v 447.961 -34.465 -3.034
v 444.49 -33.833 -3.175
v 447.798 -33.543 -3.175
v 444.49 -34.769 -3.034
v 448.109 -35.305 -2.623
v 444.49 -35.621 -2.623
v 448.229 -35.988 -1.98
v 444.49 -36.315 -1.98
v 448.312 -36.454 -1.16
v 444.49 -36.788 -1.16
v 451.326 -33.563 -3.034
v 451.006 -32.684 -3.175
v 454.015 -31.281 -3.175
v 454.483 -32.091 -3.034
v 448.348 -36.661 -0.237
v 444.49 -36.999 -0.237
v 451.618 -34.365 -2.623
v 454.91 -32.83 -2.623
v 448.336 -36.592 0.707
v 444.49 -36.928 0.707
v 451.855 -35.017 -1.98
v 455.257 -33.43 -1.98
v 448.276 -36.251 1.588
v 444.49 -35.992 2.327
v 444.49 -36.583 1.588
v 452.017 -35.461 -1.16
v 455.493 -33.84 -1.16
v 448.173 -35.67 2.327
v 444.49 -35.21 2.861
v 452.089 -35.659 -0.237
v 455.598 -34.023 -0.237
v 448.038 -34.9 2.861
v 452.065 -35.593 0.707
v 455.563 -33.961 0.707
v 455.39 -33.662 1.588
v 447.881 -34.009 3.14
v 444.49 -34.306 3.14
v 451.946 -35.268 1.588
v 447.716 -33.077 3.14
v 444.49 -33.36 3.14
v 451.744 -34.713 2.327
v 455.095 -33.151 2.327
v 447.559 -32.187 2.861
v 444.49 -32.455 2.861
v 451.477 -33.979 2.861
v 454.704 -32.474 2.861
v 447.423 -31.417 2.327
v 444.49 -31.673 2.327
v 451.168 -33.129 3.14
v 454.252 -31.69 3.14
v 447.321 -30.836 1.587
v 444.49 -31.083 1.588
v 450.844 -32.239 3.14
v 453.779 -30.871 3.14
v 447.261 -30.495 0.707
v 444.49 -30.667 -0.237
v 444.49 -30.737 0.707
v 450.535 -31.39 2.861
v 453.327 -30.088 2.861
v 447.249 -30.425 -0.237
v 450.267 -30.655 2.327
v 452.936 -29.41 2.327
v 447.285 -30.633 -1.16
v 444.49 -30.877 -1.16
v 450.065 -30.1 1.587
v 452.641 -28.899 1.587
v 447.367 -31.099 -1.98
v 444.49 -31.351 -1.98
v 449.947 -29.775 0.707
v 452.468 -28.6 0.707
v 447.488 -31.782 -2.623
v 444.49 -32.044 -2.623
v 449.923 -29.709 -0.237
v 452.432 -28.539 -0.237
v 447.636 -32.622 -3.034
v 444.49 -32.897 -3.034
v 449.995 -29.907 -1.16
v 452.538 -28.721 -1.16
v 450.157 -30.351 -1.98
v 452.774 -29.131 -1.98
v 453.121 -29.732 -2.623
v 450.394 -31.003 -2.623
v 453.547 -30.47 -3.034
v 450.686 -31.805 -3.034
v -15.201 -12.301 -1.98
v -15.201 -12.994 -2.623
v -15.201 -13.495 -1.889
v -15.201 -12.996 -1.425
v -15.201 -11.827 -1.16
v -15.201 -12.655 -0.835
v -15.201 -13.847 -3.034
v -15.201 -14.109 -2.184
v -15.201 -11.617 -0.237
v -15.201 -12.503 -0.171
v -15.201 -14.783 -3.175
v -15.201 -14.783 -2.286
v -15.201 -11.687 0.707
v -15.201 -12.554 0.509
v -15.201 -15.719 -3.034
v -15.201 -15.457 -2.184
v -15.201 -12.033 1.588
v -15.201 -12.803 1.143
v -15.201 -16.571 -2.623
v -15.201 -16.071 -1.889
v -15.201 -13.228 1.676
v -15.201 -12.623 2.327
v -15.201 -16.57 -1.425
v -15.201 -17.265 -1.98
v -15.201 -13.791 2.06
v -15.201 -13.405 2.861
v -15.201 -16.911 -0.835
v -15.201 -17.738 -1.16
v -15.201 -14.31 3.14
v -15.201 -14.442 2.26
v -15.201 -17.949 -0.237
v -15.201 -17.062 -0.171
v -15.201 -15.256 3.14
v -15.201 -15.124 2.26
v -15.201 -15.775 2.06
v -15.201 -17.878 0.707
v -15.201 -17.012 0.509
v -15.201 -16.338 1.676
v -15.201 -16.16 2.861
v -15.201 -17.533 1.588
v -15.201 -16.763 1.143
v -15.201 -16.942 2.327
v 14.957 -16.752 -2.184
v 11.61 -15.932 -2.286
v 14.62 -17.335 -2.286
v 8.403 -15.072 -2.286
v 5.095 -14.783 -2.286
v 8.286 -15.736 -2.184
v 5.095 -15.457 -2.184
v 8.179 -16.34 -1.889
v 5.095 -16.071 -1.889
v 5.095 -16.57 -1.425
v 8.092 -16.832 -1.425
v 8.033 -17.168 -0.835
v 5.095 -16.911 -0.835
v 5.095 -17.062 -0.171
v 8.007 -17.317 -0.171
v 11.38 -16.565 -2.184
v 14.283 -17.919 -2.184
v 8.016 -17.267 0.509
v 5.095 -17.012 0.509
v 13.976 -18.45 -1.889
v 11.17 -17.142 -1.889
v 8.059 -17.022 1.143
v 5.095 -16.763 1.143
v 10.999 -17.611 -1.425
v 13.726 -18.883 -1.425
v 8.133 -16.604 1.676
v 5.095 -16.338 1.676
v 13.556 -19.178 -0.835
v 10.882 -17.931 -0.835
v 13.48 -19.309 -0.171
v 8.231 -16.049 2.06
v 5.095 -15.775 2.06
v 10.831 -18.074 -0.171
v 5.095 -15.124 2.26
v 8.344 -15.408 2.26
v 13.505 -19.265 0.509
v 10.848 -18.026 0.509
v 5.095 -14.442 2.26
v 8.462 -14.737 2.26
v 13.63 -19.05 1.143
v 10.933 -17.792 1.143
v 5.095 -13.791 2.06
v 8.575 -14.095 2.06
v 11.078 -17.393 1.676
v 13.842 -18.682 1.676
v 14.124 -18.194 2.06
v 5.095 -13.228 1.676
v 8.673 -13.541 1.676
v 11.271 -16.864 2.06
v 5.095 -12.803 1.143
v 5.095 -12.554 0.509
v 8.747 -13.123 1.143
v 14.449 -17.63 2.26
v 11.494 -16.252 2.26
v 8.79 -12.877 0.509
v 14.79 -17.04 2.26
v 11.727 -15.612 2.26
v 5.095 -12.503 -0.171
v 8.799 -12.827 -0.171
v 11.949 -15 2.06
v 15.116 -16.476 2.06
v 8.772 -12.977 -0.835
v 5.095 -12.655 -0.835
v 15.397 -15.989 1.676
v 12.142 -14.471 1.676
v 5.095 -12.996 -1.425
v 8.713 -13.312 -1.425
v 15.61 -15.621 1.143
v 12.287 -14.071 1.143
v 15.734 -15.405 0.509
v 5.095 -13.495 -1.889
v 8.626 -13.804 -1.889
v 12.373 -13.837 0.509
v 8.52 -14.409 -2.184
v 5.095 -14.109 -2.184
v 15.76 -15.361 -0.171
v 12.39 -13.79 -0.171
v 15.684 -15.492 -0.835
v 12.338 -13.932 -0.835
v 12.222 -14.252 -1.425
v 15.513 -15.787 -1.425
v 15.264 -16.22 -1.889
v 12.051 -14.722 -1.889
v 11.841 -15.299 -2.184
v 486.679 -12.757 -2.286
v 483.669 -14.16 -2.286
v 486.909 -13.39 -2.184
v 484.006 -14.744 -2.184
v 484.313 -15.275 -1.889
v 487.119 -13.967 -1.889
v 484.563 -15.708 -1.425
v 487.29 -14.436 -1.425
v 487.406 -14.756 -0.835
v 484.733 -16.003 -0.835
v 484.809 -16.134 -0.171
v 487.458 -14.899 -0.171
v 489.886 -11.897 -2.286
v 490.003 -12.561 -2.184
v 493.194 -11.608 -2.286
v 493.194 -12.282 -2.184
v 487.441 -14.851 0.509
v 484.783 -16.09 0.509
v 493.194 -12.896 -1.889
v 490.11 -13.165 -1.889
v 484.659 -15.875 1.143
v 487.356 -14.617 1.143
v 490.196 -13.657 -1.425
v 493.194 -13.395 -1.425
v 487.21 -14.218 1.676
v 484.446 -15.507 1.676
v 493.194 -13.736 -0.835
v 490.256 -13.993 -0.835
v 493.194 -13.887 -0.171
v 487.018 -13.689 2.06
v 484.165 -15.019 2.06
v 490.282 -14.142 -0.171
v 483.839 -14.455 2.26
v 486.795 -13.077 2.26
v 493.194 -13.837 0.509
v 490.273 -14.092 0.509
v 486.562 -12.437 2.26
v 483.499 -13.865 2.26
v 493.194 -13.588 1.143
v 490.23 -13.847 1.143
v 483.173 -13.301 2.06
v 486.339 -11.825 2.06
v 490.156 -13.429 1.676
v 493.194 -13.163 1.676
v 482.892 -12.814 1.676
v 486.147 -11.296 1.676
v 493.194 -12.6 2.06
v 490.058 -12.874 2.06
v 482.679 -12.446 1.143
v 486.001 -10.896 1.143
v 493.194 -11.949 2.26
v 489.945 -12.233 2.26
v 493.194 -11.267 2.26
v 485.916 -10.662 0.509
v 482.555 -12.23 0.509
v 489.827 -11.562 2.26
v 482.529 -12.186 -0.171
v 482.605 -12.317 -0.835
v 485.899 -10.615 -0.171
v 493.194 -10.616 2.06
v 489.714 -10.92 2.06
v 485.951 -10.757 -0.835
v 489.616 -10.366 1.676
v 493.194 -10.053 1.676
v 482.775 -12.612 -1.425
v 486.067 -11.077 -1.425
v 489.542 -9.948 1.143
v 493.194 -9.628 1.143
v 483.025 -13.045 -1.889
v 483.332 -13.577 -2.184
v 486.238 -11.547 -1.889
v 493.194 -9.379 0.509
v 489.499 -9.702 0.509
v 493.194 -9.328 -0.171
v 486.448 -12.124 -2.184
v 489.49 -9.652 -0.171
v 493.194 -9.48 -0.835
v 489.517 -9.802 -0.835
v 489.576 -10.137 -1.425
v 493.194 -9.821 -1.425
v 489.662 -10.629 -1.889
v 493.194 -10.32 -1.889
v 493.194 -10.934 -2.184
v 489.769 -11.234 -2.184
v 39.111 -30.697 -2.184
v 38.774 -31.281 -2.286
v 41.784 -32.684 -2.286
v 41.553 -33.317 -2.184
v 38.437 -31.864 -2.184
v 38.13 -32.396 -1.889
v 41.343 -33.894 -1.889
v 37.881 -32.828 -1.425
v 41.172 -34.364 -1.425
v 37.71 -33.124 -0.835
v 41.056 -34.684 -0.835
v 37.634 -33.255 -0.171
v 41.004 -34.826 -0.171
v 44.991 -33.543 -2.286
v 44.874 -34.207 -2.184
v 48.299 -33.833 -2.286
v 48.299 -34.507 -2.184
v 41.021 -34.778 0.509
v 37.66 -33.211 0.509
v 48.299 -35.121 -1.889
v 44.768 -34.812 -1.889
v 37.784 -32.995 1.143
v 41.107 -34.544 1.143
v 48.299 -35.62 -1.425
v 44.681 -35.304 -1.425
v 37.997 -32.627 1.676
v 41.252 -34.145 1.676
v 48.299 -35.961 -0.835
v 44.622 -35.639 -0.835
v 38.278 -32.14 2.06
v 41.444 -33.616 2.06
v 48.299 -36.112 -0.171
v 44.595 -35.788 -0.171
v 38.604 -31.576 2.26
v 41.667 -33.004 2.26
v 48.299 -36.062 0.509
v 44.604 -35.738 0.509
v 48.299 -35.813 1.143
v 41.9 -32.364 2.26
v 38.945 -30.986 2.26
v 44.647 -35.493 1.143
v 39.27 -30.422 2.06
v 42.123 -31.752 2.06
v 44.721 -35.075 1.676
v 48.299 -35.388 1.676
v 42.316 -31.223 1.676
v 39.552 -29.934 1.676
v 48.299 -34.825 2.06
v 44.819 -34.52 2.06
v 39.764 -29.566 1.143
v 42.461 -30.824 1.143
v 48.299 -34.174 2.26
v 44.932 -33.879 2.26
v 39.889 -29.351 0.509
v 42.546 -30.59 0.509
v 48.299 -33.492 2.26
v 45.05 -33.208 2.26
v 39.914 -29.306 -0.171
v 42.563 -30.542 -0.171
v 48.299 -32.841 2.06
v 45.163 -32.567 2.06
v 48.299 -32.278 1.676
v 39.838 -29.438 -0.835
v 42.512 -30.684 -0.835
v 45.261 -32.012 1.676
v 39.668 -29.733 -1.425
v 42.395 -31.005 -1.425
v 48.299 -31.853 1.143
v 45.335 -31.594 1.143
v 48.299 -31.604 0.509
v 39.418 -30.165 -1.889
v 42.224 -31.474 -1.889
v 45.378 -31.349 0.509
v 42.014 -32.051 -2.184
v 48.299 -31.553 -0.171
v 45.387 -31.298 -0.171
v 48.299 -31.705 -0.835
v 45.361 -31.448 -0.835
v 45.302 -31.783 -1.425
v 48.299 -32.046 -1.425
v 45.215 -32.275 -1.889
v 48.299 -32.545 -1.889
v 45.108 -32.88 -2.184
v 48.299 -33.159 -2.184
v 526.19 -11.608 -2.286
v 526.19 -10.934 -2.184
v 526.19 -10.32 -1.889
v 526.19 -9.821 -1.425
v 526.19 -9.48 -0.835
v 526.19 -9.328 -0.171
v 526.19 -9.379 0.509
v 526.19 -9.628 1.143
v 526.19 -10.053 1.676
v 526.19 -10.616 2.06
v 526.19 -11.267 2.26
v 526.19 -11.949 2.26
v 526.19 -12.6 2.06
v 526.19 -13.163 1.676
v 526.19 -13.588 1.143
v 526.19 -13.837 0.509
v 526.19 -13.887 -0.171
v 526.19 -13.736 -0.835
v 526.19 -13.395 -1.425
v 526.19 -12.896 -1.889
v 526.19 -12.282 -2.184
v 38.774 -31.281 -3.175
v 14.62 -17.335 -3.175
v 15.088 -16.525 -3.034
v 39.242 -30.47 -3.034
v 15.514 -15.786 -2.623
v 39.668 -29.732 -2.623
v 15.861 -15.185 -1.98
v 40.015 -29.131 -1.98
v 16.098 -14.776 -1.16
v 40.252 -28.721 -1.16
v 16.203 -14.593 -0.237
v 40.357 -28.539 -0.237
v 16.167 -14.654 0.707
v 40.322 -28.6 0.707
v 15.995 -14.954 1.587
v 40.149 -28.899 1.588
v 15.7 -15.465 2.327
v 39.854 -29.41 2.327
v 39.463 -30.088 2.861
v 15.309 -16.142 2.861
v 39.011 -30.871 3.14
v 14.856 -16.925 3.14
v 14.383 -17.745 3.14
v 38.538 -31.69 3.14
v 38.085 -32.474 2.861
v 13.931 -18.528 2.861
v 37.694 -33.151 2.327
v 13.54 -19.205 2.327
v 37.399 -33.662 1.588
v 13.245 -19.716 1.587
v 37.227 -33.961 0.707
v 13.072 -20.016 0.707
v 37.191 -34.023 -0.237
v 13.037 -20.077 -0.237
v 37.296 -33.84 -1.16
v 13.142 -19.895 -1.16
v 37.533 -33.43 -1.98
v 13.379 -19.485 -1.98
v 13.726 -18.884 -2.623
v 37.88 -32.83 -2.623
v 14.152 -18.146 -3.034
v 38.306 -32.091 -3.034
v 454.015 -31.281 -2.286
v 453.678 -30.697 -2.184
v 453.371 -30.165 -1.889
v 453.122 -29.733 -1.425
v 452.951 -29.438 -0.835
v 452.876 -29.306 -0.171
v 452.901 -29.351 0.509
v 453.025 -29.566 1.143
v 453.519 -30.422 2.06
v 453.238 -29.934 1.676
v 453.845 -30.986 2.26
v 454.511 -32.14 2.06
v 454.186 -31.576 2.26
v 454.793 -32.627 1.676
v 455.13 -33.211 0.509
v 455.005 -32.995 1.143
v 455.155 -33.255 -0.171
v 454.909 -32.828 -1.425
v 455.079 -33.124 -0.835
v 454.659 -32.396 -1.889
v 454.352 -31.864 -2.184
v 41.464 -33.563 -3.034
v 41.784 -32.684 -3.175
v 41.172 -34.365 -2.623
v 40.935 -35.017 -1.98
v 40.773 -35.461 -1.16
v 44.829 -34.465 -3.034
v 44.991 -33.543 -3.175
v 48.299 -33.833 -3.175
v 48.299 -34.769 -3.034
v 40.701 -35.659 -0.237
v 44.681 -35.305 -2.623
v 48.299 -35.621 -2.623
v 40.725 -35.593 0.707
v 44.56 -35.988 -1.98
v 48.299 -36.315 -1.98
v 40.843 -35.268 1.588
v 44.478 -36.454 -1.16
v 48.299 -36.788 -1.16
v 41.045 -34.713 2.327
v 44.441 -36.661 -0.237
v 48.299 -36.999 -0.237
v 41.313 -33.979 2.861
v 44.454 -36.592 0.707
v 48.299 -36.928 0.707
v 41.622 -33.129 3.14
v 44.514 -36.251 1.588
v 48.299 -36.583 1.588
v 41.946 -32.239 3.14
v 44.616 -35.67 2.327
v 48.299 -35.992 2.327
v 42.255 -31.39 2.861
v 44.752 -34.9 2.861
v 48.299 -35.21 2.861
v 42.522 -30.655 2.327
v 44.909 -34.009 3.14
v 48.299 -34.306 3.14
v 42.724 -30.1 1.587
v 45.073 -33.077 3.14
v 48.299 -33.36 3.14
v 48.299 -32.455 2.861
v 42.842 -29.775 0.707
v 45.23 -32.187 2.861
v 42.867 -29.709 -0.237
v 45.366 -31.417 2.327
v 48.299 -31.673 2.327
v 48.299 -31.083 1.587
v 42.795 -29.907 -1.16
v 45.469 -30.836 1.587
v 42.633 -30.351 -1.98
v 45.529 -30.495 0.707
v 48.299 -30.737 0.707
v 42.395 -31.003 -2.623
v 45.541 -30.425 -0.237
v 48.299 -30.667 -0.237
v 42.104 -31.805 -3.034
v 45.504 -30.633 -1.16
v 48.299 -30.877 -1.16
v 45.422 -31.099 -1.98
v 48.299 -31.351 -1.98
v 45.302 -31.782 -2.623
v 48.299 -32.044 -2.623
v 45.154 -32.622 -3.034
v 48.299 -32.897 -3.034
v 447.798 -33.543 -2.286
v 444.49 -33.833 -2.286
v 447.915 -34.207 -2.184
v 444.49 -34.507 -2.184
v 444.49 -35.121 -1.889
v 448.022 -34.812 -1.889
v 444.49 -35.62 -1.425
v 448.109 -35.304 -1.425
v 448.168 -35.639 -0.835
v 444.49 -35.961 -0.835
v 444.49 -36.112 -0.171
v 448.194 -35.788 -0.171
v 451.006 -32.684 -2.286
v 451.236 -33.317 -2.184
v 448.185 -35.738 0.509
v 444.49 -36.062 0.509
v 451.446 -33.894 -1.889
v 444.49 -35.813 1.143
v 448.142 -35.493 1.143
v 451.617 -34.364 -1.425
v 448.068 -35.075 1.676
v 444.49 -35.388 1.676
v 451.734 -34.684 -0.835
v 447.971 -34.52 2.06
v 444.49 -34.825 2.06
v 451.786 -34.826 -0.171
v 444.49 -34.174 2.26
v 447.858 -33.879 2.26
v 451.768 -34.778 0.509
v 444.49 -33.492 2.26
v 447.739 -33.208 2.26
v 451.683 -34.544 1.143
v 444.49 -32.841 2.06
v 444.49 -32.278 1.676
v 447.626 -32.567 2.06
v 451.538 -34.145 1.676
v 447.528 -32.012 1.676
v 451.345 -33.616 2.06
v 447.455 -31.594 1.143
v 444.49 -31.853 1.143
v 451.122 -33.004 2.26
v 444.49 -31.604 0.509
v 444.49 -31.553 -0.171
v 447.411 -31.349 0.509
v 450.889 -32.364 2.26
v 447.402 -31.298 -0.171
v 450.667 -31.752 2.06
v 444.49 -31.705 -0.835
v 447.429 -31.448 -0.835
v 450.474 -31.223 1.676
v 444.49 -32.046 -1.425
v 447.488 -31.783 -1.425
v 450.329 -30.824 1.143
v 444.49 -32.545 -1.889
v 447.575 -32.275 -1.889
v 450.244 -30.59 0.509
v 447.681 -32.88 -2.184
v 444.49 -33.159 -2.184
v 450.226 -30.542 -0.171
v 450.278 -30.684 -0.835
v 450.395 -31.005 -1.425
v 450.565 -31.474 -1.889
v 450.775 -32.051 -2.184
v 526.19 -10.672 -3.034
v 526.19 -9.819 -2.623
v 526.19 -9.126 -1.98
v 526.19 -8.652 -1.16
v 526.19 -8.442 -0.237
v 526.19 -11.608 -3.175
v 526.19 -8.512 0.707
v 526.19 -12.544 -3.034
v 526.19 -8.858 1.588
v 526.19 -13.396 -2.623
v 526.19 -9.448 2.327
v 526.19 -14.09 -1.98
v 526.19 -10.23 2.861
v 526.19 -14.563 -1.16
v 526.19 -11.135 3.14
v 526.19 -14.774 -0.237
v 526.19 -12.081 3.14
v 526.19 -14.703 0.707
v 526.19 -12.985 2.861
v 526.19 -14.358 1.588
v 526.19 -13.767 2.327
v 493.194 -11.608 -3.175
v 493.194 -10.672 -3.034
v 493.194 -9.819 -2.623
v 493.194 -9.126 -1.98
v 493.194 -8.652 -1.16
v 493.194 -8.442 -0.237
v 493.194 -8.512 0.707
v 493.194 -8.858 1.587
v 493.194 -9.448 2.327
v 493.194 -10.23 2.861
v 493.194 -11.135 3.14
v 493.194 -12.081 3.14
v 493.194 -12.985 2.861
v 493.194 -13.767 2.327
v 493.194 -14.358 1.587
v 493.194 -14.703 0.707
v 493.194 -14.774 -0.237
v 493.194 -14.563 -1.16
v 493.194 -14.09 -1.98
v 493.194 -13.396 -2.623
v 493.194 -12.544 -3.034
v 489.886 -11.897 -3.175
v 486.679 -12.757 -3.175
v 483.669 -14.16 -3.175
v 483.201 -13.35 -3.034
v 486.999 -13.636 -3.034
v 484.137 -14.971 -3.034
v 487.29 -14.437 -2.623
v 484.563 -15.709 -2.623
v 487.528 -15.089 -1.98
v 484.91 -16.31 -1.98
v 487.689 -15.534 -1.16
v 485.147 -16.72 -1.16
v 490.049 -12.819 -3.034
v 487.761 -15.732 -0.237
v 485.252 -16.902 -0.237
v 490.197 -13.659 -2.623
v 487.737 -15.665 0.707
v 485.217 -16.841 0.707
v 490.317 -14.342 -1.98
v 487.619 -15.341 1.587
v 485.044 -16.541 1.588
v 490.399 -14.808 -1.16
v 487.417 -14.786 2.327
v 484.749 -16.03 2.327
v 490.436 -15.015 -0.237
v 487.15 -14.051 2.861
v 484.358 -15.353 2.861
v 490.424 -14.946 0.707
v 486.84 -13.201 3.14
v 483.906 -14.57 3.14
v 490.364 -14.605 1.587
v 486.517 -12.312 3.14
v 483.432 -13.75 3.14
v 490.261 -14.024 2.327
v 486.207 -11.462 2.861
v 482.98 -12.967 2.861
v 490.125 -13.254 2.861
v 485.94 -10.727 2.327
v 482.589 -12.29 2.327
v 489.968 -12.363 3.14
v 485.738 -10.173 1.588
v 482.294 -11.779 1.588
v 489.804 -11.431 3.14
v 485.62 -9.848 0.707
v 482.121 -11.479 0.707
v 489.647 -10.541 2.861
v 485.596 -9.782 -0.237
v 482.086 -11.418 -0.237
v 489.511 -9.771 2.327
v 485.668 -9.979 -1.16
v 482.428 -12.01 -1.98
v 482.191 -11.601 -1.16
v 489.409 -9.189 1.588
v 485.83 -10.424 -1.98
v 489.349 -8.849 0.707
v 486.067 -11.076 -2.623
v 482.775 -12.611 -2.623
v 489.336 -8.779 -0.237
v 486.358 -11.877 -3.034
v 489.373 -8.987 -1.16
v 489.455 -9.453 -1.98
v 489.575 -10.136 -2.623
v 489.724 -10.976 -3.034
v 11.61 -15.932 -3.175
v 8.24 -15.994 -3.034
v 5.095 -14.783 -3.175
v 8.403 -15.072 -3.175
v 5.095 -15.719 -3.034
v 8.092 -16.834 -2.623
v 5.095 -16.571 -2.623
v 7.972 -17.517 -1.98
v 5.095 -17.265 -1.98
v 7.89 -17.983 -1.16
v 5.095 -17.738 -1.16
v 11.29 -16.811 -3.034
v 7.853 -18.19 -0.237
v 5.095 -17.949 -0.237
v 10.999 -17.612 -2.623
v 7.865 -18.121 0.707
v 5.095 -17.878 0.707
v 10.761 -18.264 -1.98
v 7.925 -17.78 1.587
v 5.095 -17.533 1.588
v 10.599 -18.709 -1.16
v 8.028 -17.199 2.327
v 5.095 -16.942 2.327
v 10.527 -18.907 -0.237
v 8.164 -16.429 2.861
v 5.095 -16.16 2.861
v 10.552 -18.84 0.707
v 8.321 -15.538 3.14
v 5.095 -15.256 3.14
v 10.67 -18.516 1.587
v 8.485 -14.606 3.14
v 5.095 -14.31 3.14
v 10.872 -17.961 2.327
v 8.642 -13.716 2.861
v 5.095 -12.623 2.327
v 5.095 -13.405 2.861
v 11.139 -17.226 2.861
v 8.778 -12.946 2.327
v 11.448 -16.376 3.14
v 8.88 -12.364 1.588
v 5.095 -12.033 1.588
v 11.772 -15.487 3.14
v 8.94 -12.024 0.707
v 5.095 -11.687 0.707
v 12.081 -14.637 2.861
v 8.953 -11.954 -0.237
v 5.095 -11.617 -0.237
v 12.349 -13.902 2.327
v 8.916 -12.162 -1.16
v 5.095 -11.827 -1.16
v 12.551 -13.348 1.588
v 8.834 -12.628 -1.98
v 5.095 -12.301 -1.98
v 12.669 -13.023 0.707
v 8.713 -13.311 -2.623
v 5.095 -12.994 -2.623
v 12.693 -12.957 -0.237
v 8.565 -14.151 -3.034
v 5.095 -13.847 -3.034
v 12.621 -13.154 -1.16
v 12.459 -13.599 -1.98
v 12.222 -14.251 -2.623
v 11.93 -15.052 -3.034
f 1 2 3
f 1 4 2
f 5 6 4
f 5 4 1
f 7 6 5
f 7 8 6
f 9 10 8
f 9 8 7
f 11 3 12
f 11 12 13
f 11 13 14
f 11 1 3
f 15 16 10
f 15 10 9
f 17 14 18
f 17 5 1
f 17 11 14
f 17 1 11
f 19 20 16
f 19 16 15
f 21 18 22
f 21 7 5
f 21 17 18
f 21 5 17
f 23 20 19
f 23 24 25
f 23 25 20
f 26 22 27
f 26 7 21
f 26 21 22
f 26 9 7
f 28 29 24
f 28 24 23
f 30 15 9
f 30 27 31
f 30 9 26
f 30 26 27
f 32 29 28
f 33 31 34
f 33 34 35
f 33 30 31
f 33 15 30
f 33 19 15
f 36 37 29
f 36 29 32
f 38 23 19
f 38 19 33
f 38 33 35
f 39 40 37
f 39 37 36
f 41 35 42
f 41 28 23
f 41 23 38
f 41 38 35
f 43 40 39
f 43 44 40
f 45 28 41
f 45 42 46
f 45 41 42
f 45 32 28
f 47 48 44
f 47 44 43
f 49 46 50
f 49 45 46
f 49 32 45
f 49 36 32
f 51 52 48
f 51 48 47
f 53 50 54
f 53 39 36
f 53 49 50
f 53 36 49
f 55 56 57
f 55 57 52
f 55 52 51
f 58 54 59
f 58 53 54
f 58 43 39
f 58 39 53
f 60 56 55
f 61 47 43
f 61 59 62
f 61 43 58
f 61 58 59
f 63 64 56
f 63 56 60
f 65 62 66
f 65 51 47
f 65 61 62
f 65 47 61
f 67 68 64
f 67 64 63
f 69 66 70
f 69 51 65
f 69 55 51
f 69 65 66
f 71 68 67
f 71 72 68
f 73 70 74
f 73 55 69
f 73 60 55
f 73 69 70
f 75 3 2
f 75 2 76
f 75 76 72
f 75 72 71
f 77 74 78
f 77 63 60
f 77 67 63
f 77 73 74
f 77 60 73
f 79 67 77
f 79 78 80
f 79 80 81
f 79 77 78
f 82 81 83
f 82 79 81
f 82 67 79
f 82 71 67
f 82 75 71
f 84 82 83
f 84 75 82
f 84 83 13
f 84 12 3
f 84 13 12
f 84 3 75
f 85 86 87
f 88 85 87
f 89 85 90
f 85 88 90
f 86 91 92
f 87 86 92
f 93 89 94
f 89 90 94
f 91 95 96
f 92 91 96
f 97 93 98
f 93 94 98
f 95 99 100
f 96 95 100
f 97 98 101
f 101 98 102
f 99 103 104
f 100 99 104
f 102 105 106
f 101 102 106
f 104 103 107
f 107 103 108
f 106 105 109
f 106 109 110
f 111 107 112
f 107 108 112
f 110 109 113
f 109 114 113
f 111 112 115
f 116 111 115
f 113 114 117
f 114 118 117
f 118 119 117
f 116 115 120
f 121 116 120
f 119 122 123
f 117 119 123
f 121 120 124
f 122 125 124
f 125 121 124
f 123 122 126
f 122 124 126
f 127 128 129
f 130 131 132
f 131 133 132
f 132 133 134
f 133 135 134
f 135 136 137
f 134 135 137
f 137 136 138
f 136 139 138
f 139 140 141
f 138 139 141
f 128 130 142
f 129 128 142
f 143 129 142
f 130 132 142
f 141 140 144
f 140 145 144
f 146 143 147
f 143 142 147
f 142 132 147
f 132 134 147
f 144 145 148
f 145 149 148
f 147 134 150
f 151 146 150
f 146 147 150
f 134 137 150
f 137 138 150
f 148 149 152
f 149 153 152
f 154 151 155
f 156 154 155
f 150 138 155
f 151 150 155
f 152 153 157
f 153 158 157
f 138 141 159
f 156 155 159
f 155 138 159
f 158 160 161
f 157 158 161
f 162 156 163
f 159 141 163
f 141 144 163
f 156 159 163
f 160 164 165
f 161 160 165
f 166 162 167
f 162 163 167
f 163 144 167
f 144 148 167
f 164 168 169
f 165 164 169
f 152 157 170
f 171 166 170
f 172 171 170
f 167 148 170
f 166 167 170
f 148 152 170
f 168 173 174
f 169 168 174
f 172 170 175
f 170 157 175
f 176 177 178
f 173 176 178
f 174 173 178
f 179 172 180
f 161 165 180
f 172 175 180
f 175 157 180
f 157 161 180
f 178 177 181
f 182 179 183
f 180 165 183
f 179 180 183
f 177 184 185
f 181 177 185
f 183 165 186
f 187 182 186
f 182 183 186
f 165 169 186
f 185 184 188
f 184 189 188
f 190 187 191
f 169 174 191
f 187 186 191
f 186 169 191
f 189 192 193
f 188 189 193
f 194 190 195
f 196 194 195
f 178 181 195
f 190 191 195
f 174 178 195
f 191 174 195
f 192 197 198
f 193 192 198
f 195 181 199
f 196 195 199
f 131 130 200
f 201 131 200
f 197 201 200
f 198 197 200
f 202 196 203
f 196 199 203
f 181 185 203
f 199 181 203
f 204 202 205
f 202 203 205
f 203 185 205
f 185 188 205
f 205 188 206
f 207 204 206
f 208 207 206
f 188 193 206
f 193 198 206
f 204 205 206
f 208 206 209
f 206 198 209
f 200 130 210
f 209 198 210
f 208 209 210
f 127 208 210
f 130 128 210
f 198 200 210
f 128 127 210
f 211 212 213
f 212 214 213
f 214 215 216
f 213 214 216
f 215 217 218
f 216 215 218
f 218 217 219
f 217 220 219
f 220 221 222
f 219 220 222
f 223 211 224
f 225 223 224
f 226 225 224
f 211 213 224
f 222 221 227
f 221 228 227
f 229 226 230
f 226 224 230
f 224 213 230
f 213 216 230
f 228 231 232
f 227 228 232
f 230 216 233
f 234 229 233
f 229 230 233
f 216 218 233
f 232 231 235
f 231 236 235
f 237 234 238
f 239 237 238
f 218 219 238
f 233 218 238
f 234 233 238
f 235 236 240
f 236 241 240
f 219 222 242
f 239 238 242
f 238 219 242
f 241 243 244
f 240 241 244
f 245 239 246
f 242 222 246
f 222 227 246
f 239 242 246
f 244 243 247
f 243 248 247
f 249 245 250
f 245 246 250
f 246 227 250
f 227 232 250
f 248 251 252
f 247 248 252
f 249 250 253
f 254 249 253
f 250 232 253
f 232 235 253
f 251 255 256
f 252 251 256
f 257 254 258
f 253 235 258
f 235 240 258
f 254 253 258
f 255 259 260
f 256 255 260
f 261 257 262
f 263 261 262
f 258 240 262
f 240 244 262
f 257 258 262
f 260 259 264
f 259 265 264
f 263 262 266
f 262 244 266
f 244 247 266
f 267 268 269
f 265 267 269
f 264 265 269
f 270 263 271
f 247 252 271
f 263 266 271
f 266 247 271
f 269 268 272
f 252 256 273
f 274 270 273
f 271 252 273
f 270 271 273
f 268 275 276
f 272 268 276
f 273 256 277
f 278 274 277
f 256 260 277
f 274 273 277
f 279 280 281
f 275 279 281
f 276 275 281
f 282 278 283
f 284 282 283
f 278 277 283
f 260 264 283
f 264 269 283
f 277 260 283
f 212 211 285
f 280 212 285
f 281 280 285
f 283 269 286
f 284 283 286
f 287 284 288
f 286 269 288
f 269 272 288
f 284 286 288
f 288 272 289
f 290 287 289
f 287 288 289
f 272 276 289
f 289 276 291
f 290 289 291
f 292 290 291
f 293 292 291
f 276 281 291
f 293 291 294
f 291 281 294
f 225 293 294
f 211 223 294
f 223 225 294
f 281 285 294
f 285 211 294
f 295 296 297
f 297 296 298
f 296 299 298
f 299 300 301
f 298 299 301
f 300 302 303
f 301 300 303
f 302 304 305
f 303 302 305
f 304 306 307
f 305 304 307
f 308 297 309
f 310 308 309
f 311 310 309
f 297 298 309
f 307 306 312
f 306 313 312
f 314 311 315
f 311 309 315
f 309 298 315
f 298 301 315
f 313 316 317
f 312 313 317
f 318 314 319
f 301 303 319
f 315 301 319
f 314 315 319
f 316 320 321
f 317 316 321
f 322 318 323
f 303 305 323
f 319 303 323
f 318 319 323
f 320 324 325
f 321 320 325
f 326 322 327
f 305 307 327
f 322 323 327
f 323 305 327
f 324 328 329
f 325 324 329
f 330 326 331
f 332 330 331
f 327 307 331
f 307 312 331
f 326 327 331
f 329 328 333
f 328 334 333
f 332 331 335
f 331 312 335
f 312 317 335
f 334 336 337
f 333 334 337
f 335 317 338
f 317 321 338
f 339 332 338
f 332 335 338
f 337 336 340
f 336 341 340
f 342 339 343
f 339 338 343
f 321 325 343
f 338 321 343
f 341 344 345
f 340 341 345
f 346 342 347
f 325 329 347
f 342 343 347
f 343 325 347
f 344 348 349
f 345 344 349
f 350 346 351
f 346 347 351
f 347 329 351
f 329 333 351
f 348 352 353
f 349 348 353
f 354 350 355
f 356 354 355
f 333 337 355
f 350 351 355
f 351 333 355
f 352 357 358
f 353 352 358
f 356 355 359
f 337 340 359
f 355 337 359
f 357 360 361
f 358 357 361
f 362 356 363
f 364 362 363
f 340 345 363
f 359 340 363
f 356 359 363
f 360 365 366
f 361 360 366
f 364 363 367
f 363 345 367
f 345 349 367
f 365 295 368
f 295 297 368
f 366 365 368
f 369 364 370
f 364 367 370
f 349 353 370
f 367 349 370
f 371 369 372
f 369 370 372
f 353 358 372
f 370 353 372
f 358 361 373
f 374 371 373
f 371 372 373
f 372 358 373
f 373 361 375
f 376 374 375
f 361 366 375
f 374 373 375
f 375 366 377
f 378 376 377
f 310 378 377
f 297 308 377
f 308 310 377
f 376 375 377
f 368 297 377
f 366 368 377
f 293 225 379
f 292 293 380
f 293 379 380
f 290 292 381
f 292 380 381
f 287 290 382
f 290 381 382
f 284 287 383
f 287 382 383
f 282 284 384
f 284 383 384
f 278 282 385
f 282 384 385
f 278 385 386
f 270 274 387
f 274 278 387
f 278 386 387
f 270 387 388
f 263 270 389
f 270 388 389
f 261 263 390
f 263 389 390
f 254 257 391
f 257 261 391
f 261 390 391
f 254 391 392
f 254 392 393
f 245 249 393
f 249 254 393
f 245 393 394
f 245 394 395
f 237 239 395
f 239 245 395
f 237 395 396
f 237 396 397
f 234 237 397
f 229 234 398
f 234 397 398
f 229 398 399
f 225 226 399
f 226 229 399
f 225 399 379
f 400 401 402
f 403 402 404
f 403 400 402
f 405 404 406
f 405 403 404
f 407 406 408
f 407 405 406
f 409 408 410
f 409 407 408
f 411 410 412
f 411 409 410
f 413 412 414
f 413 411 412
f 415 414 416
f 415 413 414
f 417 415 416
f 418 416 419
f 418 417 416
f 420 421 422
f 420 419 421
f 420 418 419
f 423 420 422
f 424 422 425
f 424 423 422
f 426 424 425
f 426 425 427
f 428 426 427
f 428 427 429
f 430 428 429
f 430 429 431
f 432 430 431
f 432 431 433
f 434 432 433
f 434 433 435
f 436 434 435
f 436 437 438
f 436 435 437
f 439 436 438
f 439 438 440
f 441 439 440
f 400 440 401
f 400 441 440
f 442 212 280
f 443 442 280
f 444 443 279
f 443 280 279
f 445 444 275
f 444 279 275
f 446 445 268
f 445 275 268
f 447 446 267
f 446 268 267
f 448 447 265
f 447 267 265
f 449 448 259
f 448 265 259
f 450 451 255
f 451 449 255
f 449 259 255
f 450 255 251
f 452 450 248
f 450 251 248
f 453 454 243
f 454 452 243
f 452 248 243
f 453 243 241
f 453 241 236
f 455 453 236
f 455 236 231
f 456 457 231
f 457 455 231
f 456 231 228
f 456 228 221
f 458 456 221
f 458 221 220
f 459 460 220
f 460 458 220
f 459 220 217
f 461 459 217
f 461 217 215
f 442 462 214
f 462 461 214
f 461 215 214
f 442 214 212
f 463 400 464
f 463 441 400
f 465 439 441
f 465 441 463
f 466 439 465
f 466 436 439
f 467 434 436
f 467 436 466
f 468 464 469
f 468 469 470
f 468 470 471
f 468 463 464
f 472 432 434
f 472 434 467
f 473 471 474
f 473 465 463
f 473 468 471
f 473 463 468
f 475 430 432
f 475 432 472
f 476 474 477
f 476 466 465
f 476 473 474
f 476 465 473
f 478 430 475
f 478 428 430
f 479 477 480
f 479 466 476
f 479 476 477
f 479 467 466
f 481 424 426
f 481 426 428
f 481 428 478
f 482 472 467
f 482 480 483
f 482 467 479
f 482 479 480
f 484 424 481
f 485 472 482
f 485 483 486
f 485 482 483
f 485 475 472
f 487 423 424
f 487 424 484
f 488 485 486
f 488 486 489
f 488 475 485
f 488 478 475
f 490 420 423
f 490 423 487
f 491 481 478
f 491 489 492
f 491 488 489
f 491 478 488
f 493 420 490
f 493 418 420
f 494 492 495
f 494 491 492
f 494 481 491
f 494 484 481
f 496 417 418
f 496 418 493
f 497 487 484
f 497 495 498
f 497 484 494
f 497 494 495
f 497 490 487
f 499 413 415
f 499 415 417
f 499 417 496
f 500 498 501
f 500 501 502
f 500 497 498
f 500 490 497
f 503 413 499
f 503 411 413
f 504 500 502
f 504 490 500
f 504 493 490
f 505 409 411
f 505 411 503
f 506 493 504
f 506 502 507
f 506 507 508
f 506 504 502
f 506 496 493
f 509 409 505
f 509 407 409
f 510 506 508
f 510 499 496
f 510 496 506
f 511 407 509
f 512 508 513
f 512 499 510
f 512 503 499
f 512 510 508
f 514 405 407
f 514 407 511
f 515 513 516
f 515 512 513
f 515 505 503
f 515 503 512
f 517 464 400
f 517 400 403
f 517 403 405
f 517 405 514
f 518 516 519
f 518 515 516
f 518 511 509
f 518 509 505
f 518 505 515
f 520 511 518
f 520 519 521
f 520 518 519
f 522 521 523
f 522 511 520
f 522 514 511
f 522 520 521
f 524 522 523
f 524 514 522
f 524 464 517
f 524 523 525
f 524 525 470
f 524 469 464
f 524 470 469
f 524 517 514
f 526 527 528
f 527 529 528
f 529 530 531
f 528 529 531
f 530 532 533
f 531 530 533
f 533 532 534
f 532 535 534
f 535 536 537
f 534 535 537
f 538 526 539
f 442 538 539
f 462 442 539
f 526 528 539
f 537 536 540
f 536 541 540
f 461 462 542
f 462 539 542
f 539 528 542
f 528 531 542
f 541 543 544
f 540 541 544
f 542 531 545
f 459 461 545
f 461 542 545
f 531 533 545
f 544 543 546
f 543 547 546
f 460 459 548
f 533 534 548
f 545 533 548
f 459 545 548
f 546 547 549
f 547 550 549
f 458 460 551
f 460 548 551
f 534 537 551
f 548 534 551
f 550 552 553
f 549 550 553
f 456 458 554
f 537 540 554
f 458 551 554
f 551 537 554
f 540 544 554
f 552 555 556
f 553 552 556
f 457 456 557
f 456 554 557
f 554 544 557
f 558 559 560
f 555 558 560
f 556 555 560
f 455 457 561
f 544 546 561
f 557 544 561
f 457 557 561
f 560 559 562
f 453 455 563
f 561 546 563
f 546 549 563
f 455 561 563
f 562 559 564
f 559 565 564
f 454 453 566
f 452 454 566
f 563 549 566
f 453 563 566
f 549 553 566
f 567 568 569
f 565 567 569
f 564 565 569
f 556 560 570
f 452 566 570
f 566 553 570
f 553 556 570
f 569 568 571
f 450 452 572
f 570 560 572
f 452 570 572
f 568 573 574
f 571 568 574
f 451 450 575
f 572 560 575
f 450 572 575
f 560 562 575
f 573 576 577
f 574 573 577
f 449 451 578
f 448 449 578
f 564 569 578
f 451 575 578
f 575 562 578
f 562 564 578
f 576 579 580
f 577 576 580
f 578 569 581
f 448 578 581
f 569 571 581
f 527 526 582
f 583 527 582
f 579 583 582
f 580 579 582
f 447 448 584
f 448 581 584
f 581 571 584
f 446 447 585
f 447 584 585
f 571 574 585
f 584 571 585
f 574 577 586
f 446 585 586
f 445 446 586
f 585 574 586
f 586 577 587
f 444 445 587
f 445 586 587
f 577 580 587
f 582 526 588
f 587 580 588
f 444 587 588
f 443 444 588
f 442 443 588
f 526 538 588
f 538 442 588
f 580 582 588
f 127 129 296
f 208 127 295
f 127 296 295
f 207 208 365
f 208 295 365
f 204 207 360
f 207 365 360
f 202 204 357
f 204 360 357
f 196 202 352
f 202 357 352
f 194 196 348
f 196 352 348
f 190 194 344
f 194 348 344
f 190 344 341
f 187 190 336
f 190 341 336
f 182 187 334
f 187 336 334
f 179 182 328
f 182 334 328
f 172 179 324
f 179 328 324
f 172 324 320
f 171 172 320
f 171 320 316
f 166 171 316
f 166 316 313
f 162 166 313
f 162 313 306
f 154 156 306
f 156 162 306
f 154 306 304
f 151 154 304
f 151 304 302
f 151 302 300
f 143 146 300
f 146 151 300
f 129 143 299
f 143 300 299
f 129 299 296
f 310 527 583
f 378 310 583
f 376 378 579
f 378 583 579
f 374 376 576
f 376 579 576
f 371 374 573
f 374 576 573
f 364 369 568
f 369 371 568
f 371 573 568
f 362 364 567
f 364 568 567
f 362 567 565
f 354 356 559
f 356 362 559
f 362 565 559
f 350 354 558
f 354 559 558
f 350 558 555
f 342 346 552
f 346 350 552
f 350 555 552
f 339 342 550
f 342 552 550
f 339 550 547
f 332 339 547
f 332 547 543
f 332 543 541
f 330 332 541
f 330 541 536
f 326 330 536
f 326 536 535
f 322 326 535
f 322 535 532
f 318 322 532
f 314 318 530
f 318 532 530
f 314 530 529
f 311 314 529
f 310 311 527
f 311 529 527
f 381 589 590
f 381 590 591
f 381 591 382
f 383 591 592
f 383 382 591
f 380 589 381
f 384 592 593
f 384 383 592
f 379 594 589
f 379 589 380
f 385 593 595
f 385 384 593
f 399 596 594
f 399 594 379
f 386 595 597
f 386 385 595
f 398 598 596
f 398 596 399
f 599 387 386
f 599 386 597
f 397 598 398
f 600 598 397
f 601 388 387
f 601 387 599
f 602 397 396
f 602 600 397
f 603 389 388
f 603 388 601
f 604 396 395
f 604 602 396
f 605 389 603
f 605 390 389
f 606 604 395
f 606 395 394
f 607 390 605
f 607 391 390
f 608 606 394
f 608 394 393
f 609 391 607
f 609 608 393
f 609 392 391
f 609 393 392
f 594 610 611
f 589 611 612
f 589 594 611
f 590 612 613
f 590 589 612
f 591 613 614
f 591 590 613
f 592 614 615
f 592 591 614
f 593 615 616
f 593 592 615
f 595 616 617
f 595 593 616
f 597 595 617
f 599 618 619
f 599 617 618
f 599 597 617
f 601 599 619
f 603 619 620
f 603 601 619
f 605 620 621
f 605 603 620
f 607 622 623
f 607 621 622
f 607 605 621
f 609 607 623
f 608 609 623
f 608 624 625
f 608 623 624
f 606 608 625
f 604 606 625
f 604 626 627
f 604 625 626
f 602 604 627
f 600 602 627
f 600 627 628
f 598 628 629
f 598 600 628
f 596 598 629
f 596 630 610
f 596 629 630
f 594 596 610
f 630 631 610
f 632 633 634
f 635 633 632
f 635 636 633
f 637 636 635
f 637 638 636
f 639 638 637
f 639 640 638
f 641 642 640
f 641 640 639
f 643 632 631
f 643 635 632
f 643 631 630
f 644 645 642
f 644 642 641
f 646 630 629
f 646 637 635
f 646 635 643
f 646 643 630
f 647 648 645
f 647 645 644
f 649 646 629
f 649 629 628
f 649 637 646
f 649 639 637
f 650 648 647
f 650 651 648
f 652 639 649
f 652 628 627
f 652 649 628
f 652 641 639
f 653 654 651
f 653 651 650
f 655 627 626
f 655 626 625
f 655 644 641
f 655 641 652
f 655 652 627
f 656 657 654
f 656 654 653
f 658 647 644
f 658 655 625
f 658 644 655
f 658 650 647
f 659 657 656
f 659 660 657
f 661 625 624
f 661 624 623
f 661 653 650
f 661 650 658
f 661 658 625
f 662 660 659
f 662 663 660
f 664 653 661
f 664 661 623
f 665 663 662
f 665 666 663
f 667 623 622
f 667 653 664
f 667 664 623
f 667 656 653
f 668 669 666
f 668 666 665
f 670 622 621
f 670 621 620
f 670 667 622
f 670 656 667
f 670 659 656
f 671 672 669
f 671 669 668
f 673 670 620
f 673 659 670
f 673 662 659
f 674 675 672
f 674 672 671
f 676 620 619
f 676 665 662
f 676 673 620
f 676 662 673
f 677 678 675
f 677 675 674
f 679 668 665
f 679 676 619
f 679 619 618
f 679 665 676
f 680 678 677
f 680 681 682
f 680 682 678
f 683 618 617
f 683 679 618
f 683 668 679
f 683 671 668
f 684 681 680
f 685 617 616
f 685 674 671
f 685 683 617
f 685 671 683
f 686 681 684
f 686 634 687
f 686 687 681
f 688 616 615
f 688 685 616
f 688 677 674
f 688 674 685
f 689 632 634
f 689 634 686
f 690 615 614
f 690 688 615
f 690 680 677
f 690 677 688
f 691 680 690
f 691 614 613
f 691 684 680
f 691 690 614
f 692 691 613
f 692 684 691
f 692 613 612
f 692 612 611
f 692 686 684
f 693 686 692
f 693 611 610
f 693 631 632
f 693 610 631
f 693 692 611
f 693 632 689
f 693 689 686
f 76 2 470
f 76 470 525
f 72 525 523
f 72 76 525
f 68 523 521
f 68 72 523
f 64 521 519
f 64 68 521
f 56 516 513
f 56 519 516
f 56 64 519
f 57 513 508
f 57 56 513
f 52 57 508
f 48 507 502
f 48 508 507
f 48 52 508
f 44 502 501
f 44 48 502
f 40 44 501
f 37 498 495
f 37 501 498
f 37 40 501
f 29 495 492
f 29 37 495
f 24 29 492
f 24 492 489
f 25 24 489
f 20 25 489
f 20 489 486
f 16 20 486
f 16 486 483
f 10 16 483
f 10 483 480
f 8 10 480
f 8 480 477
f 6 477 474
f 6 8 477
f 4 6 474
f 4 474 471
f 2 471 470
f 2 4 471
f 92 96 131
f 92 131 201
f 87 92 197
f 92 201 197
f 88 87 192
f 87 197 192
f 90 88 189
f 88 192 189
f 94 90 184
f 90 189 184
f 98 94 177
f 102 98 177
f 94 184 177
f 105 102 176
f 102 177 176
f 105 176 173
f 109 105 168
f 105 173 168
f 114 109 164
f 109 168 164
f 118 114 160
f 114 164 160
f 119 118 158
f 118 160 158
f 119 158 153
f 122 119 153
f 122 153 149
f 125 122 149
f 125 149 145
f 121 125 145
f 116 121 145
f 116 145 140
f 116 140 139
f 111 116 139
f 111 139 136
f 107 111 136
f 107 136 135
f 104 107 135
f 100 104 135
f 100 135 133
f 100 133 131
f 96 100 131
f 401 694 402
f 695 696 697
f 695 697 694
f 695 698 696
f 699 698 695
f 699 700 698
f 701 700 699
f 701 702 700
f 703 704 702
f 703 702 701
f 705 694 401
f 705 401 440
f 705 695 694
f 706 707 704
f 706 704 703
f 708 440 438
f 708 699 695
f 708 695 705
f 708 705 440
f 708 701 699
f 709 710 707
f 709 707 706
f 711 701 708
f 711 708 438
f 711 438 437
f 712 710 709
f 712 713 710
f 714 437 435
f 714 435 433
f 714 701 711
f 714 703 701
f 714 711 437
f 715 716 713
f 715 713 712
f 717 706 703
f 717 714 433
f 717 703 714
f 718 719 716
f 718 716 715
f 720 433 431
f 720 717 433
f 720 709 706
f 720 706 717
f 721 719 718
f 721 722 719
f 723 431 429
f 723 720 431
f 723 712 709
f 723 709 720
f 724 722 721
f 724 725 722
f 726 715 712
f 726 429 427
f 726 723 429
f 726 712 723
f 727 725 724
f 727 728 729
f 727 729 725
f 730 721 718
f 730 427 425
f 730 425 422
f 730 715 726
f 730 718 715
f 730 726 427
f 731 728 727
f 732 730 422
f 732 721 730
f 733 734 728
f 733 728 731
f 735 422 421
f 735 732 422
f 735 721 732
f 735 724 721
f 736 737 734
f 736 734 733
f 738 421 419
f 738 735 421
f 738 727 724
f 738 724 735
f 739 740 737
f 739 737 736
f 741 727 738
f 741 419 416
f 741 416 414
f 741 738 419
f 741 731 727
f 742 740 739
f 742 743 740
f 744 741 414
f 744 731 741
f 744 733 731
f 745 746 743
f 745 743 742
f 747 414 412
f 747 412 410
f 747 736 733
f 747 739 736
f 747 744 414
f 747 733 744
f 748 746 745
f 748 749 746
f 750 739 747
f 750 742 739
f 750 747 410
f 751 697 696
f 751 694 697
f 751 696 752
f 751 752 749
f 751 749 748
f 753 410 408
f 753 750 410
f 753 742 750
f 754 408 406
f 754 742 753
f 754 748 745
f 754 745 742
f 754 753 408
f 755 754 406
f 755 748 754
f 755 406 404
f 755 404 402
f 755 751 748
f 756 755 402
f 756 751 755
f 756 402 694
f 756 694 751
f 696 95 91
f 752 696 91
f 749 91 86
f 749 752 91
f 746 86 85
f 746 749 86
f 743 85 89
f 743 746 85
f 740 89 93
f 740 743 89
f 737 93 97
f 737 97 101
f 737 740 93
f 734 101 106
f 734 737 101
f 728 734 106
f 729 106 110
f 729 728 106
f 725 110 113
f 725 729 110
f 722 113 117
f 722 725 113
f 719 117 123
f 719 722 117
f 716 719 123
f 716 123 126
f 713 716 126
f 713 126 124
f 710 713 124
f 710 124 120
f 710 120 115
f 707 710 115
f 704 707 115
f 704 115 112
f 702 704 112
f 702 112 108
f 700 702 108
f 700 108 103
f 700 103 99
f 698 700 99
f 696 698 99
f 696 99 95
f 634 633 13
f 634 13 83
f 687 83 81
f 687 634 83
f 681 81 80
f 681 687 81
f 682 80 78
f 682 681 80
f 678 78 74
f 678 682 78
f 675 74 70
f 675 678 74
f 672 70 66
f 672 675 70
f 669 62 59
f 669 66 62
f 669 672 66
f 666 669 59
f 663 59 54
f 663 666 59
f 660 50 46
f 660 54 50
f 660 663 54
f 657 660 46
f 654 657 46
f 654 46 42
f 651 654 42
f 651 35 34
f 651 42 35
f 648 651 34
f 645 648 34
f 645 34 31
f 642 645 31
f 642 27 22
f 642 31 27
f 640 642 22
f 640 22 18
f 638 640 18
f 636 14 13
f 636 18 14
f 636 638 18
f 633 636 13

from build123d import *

# Parameters (mm, degrees)
SKETCH2_R   = 3.175
SKETCH2_R_2 = 2.286


with BuildPart() as part:
    # Sweep1: sweep along a path in Sketch1
    with BuildLine(Plane.XY) as sweep1_path:
        Line((-15.200789542, -14.78287466), (5.094778342, -14.78287466))
        ThreePointArc((5.094778342, -14.78287466), (10.025281152, -15.431987669), (14.619778342, -17.335090718))
        Line((14.619778342, -17.335090718), (38.774210458, -31.280658602))
        ThreePointArc((38.774210458, -31.280658602), (43.368707649, -33.183761651), (48.299210458, -33.83287466))
        Line((48.299210458, -33.83287466), (444.490346227, -33.83287466))
        ThreePointArc((444.490346227, -33.83287466), (449.420849036, -33.183761651), (454.015346227, -31.280658602))
        Line((454.015346227, -31.280658602), (483.669039656, -14.160090718))
        ThreePointArc((483.669039656, -14.160090718), (488.263536847, -12.256987669), (493.194039656, -11.60787466))
        Line((493.194039656, -11.60787466), (526.189607541, -11.60787466))
    # Sketch2 → Sweep1 (sweep)
    with BuildSketch(Plane(origin=(-15.200789542, -14.78287466, 0), x_dir=(0, 0, -1), z_dir=(1, 0, 0))):
        Circle(SKETCH2_R)
        Circle(SKETCH2_R_2, mode=Mode.SUBTRACT)
    sweep(path=sweep1_path.line)


solid = part.part
